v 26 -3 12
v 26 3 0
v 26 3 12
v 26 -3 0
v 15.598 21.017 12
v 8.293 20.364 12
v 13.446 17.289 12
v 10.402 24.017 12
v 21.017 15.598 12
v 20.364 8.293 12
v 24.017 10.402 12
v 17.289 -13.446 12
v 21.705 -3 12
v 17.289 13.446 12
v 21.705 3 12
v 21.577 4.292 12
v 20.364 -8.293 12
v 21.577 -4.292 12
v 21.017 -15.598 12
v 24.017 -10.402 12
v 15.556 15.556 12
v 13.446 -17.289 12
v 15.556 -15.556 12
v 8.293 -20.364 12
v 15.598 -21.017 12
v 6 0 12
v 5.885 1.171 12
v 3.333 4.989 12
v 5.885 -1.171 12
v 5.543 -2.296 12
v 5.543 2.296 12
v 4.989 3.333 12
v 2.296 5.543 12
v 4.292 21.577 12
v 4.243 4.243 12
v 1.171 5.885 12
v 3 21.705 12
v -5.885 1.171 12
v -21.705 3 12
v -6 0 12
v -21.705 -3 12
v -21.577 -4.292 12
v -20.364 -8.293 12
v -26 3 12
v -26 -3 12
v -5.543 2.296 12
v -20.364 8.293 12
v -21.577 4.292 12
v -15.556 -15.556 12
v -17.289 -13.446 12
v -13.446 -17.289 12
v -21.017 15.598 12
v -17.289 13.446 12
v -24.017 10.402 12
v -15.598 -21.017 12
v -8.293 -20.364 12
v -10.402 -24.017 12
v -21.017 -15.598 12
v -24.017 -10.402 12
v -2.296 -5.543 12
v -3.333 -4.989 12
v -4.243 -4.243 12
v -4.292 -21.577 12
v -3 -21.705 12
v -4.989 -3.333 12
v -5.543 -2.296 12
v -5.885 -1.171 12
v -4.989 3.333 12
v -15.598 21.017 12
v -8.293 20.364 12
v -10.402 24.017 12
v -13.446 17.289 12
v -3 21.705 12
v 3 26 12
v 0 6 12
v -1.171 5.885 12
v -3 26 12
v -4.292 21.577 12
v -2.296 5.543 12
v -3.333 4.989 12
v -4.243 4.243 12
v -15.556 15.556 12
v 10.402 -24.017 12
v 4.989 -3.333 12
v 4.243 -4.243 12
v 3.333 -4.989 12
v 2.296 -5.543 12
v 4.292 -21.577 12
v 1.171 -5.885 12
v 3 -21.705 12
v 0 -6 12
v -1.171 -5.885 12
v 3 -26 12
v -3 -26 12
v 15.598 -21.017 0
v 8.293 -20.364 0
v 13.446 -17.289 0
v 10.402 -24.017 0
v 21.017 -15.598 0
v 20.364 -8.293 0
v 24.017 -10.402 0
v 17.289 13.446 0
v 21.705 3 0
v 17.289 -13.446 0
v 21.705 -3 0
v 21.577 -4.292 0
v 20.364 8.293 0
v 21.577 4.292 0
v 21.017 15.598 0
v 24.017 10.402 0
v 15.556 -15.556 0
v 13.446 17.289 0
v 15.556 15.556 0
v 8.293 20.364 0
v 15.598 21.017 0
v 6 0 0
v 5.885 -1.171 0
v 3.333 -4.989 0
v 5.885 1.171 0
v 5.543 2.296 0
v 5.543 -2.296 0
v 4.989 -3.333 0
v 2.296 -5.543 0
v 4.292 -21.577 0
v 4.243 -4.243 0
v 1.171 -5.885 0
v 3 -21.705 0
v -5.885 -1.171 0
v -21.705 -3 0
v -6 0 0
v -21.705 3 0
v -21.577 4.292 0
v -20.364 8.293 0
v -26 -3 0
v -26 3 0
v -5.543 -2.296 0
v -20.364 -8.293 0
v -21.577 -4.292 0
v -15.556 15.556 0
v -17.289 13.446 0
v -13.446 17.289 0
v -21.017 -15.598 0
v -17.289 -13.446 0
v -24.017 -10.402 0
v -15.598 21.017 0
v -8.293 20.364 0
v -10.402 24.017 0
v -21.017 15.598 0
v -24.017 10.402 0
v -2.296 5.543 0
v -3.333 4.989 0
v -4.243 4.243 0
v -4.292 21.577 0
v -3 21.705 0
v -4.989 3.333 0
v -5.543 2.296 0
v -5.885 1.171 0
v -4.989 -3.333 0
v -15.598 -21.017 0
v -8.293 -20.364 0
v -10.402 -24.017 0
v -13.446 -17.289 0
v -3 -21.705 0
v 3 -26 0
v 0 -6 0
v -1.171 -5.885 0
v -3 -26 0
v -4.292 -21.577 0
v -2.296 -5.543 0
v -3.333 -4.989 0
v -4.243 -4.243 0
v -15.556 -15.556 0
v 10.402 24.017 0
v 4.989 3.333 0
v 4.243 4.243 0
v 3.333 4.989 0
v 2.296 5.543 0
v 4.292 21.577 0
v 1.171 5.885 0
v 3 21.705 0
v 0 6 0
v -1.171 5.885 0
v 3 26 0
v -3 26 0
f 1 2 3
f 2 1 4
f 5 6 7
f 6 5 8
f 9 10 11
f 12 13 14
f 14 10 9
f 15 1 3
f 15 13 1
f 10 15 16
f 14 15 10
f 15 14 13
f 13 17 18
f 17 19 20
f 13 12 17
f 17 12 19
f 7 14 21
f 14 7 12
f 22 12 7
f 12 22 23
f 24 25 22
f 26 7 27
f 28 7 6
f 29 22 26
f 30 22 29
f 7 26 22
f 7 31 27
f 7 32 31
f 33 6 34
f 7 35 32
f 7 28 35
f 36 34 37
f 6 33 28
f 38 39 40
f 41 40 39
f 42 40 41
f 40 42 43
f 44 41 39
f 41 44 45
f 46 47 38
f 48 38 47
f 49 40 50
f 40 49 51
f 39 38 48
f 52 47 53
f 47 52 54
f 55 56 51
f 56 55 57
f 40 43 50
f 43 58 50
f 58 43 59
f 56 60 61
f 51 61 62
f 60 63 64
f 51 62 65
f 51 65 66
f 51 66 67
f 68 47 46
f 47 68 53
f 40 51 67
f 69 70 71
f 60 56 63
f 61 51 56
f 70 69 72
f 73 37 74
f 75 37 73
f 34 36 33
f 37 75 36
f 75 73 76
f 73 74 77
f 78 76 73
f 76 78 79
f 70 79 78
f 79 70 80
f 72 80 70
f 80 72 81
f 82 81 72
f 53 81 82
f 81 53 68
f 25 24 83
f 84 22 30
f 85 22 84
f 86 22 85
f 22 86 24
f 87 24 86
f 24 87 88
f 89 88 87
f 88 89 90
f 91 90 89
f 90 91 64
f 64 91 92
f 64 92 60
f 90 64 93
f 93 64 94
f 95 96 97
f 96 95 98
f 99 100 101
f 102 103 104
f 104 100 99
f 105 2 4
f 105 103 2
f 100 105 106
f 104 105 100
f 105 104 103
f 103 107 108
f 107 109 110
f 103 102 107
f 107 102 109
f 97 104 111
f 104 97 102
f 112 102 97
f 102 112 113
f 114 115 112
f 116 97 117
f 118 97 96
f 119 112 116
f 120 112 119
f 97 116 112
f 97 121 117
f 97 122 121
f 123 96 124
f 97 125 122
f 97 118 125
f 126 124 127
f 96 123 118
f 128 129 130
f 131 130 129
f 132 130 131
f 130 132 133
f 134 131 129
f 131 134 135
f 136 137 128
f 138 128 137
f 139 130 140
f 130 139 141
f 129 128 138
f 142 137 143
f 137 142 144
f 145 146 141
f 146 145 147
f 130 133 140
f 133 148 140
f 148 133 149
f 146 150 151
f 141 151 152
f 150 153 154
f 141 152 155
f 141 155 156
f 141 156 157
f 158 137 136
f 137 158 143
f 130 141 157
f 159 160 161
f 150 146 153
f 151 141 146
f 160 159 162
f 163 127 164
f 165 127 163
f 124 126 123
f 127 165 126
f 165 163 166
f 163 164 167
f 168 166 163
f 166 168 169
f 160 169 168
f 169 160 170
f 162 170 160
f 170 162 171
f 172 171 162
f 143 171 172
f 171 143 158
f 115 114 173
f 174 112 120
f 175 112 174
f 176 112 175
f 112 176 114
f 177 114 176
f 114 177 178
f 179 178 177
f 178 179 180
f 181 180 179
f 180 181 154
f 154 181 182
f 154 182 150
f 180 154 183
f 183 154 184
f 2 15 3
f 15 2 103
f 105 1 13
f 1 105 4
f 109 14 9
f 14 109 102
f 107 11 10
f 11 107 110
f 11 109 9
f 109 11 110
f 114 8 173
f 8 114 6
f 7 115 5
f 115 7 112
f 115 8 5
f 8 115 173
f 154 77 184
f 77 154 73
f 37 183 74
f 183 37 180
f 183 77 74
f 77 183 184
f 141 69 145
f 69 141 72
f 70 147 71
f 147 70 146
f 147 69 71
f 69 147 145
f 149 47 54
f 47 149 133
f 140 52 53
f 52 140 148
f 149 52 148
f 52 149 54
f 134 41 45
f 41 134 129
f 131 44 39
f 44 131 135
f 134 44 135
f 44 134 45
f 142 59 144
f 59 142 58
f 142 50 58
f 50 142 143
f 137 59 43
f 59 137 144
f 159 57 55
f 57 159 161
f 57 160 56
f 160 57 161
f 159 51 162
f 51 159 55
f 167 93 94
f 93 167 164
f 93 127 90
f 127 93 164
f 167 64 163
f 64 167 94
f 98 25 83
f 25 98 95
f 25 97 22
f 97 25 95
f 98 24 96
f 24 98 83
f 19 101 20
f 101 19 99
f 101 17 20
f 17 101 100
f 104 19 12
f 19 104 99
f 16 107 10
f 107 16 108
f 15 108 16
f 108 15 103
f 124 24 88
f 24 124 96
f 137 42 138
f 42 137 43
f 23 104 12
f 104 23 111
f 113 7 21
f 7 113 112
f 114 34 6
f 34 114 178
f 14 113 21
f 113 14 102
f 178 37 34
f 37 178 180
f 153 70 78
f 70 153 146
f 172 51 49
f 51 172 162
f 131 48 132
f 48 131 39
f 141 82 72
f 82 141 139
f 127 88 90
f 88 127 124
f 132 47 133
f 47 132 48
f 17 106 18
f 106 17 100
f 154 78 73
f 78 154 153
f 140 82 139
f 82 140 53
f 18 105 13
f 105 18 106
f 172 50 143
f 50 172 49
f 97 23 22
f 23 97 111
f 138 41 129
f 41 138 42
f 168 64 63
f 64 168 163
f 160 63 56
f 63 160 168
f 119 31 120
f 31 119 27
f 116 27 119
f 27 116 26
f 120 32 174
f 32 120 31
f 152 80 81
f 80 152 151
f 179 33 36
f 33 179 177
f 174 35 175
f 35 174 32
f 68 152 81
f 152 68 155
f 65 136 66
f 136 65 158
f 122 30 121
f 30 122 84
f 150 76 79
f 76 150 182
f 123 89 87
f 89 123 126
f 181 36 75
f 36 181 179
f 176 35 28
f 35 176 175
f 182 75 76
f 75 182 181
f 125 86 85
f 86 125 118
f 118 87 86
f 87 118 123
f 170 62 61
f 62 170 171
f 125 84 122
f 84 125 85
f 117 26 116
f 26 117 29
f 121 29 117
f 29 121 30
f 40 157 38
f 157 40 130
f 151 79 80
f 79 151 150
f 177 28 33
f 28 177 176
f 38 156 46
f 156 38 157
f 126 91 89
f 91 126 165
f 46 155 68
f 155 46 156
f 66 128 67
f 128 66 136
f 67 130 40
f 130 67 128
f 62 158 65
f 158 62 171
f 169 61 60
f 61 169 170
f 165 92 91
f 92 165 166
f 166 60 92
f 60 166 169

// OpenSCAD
$fn = 32;

// ----------------------------------------------------------------------
// Spur blank: bored gear blank
// ----------------------------------------------------------------------

// --- parameters (mm) ---
disc_r = 22;              // blank root radius
disc_t = 12;              // blank thickness
n_teeth = 12;             // stub tooth count
tooth_w = 6;              // tooth width at the root
tooth_h = 4;              // tooth height above the root
bore_r = 6;               // central bore radius

out_r = disc_r + tooth_h;  // tip radius
bbox_x = 52.0;  // measured width over the teeth
bbox_y = 52.0;  // measured depth over the teeth

difference() {
union() {
  cylinder(r = disc_r, h = disc_t);
  for (i = [0 : n_teeth - 1])
    rotate([0, 0, i * 360 / n_teeth])
      translate([disc_r - 1, -tooth_w / 2, 0])
        cube([tooth_h + 1, tooth_w, disc_t]);
}
  translate([0, 0, -1]) cylinder(r = bore_r, h = disc_t + 2);
}
